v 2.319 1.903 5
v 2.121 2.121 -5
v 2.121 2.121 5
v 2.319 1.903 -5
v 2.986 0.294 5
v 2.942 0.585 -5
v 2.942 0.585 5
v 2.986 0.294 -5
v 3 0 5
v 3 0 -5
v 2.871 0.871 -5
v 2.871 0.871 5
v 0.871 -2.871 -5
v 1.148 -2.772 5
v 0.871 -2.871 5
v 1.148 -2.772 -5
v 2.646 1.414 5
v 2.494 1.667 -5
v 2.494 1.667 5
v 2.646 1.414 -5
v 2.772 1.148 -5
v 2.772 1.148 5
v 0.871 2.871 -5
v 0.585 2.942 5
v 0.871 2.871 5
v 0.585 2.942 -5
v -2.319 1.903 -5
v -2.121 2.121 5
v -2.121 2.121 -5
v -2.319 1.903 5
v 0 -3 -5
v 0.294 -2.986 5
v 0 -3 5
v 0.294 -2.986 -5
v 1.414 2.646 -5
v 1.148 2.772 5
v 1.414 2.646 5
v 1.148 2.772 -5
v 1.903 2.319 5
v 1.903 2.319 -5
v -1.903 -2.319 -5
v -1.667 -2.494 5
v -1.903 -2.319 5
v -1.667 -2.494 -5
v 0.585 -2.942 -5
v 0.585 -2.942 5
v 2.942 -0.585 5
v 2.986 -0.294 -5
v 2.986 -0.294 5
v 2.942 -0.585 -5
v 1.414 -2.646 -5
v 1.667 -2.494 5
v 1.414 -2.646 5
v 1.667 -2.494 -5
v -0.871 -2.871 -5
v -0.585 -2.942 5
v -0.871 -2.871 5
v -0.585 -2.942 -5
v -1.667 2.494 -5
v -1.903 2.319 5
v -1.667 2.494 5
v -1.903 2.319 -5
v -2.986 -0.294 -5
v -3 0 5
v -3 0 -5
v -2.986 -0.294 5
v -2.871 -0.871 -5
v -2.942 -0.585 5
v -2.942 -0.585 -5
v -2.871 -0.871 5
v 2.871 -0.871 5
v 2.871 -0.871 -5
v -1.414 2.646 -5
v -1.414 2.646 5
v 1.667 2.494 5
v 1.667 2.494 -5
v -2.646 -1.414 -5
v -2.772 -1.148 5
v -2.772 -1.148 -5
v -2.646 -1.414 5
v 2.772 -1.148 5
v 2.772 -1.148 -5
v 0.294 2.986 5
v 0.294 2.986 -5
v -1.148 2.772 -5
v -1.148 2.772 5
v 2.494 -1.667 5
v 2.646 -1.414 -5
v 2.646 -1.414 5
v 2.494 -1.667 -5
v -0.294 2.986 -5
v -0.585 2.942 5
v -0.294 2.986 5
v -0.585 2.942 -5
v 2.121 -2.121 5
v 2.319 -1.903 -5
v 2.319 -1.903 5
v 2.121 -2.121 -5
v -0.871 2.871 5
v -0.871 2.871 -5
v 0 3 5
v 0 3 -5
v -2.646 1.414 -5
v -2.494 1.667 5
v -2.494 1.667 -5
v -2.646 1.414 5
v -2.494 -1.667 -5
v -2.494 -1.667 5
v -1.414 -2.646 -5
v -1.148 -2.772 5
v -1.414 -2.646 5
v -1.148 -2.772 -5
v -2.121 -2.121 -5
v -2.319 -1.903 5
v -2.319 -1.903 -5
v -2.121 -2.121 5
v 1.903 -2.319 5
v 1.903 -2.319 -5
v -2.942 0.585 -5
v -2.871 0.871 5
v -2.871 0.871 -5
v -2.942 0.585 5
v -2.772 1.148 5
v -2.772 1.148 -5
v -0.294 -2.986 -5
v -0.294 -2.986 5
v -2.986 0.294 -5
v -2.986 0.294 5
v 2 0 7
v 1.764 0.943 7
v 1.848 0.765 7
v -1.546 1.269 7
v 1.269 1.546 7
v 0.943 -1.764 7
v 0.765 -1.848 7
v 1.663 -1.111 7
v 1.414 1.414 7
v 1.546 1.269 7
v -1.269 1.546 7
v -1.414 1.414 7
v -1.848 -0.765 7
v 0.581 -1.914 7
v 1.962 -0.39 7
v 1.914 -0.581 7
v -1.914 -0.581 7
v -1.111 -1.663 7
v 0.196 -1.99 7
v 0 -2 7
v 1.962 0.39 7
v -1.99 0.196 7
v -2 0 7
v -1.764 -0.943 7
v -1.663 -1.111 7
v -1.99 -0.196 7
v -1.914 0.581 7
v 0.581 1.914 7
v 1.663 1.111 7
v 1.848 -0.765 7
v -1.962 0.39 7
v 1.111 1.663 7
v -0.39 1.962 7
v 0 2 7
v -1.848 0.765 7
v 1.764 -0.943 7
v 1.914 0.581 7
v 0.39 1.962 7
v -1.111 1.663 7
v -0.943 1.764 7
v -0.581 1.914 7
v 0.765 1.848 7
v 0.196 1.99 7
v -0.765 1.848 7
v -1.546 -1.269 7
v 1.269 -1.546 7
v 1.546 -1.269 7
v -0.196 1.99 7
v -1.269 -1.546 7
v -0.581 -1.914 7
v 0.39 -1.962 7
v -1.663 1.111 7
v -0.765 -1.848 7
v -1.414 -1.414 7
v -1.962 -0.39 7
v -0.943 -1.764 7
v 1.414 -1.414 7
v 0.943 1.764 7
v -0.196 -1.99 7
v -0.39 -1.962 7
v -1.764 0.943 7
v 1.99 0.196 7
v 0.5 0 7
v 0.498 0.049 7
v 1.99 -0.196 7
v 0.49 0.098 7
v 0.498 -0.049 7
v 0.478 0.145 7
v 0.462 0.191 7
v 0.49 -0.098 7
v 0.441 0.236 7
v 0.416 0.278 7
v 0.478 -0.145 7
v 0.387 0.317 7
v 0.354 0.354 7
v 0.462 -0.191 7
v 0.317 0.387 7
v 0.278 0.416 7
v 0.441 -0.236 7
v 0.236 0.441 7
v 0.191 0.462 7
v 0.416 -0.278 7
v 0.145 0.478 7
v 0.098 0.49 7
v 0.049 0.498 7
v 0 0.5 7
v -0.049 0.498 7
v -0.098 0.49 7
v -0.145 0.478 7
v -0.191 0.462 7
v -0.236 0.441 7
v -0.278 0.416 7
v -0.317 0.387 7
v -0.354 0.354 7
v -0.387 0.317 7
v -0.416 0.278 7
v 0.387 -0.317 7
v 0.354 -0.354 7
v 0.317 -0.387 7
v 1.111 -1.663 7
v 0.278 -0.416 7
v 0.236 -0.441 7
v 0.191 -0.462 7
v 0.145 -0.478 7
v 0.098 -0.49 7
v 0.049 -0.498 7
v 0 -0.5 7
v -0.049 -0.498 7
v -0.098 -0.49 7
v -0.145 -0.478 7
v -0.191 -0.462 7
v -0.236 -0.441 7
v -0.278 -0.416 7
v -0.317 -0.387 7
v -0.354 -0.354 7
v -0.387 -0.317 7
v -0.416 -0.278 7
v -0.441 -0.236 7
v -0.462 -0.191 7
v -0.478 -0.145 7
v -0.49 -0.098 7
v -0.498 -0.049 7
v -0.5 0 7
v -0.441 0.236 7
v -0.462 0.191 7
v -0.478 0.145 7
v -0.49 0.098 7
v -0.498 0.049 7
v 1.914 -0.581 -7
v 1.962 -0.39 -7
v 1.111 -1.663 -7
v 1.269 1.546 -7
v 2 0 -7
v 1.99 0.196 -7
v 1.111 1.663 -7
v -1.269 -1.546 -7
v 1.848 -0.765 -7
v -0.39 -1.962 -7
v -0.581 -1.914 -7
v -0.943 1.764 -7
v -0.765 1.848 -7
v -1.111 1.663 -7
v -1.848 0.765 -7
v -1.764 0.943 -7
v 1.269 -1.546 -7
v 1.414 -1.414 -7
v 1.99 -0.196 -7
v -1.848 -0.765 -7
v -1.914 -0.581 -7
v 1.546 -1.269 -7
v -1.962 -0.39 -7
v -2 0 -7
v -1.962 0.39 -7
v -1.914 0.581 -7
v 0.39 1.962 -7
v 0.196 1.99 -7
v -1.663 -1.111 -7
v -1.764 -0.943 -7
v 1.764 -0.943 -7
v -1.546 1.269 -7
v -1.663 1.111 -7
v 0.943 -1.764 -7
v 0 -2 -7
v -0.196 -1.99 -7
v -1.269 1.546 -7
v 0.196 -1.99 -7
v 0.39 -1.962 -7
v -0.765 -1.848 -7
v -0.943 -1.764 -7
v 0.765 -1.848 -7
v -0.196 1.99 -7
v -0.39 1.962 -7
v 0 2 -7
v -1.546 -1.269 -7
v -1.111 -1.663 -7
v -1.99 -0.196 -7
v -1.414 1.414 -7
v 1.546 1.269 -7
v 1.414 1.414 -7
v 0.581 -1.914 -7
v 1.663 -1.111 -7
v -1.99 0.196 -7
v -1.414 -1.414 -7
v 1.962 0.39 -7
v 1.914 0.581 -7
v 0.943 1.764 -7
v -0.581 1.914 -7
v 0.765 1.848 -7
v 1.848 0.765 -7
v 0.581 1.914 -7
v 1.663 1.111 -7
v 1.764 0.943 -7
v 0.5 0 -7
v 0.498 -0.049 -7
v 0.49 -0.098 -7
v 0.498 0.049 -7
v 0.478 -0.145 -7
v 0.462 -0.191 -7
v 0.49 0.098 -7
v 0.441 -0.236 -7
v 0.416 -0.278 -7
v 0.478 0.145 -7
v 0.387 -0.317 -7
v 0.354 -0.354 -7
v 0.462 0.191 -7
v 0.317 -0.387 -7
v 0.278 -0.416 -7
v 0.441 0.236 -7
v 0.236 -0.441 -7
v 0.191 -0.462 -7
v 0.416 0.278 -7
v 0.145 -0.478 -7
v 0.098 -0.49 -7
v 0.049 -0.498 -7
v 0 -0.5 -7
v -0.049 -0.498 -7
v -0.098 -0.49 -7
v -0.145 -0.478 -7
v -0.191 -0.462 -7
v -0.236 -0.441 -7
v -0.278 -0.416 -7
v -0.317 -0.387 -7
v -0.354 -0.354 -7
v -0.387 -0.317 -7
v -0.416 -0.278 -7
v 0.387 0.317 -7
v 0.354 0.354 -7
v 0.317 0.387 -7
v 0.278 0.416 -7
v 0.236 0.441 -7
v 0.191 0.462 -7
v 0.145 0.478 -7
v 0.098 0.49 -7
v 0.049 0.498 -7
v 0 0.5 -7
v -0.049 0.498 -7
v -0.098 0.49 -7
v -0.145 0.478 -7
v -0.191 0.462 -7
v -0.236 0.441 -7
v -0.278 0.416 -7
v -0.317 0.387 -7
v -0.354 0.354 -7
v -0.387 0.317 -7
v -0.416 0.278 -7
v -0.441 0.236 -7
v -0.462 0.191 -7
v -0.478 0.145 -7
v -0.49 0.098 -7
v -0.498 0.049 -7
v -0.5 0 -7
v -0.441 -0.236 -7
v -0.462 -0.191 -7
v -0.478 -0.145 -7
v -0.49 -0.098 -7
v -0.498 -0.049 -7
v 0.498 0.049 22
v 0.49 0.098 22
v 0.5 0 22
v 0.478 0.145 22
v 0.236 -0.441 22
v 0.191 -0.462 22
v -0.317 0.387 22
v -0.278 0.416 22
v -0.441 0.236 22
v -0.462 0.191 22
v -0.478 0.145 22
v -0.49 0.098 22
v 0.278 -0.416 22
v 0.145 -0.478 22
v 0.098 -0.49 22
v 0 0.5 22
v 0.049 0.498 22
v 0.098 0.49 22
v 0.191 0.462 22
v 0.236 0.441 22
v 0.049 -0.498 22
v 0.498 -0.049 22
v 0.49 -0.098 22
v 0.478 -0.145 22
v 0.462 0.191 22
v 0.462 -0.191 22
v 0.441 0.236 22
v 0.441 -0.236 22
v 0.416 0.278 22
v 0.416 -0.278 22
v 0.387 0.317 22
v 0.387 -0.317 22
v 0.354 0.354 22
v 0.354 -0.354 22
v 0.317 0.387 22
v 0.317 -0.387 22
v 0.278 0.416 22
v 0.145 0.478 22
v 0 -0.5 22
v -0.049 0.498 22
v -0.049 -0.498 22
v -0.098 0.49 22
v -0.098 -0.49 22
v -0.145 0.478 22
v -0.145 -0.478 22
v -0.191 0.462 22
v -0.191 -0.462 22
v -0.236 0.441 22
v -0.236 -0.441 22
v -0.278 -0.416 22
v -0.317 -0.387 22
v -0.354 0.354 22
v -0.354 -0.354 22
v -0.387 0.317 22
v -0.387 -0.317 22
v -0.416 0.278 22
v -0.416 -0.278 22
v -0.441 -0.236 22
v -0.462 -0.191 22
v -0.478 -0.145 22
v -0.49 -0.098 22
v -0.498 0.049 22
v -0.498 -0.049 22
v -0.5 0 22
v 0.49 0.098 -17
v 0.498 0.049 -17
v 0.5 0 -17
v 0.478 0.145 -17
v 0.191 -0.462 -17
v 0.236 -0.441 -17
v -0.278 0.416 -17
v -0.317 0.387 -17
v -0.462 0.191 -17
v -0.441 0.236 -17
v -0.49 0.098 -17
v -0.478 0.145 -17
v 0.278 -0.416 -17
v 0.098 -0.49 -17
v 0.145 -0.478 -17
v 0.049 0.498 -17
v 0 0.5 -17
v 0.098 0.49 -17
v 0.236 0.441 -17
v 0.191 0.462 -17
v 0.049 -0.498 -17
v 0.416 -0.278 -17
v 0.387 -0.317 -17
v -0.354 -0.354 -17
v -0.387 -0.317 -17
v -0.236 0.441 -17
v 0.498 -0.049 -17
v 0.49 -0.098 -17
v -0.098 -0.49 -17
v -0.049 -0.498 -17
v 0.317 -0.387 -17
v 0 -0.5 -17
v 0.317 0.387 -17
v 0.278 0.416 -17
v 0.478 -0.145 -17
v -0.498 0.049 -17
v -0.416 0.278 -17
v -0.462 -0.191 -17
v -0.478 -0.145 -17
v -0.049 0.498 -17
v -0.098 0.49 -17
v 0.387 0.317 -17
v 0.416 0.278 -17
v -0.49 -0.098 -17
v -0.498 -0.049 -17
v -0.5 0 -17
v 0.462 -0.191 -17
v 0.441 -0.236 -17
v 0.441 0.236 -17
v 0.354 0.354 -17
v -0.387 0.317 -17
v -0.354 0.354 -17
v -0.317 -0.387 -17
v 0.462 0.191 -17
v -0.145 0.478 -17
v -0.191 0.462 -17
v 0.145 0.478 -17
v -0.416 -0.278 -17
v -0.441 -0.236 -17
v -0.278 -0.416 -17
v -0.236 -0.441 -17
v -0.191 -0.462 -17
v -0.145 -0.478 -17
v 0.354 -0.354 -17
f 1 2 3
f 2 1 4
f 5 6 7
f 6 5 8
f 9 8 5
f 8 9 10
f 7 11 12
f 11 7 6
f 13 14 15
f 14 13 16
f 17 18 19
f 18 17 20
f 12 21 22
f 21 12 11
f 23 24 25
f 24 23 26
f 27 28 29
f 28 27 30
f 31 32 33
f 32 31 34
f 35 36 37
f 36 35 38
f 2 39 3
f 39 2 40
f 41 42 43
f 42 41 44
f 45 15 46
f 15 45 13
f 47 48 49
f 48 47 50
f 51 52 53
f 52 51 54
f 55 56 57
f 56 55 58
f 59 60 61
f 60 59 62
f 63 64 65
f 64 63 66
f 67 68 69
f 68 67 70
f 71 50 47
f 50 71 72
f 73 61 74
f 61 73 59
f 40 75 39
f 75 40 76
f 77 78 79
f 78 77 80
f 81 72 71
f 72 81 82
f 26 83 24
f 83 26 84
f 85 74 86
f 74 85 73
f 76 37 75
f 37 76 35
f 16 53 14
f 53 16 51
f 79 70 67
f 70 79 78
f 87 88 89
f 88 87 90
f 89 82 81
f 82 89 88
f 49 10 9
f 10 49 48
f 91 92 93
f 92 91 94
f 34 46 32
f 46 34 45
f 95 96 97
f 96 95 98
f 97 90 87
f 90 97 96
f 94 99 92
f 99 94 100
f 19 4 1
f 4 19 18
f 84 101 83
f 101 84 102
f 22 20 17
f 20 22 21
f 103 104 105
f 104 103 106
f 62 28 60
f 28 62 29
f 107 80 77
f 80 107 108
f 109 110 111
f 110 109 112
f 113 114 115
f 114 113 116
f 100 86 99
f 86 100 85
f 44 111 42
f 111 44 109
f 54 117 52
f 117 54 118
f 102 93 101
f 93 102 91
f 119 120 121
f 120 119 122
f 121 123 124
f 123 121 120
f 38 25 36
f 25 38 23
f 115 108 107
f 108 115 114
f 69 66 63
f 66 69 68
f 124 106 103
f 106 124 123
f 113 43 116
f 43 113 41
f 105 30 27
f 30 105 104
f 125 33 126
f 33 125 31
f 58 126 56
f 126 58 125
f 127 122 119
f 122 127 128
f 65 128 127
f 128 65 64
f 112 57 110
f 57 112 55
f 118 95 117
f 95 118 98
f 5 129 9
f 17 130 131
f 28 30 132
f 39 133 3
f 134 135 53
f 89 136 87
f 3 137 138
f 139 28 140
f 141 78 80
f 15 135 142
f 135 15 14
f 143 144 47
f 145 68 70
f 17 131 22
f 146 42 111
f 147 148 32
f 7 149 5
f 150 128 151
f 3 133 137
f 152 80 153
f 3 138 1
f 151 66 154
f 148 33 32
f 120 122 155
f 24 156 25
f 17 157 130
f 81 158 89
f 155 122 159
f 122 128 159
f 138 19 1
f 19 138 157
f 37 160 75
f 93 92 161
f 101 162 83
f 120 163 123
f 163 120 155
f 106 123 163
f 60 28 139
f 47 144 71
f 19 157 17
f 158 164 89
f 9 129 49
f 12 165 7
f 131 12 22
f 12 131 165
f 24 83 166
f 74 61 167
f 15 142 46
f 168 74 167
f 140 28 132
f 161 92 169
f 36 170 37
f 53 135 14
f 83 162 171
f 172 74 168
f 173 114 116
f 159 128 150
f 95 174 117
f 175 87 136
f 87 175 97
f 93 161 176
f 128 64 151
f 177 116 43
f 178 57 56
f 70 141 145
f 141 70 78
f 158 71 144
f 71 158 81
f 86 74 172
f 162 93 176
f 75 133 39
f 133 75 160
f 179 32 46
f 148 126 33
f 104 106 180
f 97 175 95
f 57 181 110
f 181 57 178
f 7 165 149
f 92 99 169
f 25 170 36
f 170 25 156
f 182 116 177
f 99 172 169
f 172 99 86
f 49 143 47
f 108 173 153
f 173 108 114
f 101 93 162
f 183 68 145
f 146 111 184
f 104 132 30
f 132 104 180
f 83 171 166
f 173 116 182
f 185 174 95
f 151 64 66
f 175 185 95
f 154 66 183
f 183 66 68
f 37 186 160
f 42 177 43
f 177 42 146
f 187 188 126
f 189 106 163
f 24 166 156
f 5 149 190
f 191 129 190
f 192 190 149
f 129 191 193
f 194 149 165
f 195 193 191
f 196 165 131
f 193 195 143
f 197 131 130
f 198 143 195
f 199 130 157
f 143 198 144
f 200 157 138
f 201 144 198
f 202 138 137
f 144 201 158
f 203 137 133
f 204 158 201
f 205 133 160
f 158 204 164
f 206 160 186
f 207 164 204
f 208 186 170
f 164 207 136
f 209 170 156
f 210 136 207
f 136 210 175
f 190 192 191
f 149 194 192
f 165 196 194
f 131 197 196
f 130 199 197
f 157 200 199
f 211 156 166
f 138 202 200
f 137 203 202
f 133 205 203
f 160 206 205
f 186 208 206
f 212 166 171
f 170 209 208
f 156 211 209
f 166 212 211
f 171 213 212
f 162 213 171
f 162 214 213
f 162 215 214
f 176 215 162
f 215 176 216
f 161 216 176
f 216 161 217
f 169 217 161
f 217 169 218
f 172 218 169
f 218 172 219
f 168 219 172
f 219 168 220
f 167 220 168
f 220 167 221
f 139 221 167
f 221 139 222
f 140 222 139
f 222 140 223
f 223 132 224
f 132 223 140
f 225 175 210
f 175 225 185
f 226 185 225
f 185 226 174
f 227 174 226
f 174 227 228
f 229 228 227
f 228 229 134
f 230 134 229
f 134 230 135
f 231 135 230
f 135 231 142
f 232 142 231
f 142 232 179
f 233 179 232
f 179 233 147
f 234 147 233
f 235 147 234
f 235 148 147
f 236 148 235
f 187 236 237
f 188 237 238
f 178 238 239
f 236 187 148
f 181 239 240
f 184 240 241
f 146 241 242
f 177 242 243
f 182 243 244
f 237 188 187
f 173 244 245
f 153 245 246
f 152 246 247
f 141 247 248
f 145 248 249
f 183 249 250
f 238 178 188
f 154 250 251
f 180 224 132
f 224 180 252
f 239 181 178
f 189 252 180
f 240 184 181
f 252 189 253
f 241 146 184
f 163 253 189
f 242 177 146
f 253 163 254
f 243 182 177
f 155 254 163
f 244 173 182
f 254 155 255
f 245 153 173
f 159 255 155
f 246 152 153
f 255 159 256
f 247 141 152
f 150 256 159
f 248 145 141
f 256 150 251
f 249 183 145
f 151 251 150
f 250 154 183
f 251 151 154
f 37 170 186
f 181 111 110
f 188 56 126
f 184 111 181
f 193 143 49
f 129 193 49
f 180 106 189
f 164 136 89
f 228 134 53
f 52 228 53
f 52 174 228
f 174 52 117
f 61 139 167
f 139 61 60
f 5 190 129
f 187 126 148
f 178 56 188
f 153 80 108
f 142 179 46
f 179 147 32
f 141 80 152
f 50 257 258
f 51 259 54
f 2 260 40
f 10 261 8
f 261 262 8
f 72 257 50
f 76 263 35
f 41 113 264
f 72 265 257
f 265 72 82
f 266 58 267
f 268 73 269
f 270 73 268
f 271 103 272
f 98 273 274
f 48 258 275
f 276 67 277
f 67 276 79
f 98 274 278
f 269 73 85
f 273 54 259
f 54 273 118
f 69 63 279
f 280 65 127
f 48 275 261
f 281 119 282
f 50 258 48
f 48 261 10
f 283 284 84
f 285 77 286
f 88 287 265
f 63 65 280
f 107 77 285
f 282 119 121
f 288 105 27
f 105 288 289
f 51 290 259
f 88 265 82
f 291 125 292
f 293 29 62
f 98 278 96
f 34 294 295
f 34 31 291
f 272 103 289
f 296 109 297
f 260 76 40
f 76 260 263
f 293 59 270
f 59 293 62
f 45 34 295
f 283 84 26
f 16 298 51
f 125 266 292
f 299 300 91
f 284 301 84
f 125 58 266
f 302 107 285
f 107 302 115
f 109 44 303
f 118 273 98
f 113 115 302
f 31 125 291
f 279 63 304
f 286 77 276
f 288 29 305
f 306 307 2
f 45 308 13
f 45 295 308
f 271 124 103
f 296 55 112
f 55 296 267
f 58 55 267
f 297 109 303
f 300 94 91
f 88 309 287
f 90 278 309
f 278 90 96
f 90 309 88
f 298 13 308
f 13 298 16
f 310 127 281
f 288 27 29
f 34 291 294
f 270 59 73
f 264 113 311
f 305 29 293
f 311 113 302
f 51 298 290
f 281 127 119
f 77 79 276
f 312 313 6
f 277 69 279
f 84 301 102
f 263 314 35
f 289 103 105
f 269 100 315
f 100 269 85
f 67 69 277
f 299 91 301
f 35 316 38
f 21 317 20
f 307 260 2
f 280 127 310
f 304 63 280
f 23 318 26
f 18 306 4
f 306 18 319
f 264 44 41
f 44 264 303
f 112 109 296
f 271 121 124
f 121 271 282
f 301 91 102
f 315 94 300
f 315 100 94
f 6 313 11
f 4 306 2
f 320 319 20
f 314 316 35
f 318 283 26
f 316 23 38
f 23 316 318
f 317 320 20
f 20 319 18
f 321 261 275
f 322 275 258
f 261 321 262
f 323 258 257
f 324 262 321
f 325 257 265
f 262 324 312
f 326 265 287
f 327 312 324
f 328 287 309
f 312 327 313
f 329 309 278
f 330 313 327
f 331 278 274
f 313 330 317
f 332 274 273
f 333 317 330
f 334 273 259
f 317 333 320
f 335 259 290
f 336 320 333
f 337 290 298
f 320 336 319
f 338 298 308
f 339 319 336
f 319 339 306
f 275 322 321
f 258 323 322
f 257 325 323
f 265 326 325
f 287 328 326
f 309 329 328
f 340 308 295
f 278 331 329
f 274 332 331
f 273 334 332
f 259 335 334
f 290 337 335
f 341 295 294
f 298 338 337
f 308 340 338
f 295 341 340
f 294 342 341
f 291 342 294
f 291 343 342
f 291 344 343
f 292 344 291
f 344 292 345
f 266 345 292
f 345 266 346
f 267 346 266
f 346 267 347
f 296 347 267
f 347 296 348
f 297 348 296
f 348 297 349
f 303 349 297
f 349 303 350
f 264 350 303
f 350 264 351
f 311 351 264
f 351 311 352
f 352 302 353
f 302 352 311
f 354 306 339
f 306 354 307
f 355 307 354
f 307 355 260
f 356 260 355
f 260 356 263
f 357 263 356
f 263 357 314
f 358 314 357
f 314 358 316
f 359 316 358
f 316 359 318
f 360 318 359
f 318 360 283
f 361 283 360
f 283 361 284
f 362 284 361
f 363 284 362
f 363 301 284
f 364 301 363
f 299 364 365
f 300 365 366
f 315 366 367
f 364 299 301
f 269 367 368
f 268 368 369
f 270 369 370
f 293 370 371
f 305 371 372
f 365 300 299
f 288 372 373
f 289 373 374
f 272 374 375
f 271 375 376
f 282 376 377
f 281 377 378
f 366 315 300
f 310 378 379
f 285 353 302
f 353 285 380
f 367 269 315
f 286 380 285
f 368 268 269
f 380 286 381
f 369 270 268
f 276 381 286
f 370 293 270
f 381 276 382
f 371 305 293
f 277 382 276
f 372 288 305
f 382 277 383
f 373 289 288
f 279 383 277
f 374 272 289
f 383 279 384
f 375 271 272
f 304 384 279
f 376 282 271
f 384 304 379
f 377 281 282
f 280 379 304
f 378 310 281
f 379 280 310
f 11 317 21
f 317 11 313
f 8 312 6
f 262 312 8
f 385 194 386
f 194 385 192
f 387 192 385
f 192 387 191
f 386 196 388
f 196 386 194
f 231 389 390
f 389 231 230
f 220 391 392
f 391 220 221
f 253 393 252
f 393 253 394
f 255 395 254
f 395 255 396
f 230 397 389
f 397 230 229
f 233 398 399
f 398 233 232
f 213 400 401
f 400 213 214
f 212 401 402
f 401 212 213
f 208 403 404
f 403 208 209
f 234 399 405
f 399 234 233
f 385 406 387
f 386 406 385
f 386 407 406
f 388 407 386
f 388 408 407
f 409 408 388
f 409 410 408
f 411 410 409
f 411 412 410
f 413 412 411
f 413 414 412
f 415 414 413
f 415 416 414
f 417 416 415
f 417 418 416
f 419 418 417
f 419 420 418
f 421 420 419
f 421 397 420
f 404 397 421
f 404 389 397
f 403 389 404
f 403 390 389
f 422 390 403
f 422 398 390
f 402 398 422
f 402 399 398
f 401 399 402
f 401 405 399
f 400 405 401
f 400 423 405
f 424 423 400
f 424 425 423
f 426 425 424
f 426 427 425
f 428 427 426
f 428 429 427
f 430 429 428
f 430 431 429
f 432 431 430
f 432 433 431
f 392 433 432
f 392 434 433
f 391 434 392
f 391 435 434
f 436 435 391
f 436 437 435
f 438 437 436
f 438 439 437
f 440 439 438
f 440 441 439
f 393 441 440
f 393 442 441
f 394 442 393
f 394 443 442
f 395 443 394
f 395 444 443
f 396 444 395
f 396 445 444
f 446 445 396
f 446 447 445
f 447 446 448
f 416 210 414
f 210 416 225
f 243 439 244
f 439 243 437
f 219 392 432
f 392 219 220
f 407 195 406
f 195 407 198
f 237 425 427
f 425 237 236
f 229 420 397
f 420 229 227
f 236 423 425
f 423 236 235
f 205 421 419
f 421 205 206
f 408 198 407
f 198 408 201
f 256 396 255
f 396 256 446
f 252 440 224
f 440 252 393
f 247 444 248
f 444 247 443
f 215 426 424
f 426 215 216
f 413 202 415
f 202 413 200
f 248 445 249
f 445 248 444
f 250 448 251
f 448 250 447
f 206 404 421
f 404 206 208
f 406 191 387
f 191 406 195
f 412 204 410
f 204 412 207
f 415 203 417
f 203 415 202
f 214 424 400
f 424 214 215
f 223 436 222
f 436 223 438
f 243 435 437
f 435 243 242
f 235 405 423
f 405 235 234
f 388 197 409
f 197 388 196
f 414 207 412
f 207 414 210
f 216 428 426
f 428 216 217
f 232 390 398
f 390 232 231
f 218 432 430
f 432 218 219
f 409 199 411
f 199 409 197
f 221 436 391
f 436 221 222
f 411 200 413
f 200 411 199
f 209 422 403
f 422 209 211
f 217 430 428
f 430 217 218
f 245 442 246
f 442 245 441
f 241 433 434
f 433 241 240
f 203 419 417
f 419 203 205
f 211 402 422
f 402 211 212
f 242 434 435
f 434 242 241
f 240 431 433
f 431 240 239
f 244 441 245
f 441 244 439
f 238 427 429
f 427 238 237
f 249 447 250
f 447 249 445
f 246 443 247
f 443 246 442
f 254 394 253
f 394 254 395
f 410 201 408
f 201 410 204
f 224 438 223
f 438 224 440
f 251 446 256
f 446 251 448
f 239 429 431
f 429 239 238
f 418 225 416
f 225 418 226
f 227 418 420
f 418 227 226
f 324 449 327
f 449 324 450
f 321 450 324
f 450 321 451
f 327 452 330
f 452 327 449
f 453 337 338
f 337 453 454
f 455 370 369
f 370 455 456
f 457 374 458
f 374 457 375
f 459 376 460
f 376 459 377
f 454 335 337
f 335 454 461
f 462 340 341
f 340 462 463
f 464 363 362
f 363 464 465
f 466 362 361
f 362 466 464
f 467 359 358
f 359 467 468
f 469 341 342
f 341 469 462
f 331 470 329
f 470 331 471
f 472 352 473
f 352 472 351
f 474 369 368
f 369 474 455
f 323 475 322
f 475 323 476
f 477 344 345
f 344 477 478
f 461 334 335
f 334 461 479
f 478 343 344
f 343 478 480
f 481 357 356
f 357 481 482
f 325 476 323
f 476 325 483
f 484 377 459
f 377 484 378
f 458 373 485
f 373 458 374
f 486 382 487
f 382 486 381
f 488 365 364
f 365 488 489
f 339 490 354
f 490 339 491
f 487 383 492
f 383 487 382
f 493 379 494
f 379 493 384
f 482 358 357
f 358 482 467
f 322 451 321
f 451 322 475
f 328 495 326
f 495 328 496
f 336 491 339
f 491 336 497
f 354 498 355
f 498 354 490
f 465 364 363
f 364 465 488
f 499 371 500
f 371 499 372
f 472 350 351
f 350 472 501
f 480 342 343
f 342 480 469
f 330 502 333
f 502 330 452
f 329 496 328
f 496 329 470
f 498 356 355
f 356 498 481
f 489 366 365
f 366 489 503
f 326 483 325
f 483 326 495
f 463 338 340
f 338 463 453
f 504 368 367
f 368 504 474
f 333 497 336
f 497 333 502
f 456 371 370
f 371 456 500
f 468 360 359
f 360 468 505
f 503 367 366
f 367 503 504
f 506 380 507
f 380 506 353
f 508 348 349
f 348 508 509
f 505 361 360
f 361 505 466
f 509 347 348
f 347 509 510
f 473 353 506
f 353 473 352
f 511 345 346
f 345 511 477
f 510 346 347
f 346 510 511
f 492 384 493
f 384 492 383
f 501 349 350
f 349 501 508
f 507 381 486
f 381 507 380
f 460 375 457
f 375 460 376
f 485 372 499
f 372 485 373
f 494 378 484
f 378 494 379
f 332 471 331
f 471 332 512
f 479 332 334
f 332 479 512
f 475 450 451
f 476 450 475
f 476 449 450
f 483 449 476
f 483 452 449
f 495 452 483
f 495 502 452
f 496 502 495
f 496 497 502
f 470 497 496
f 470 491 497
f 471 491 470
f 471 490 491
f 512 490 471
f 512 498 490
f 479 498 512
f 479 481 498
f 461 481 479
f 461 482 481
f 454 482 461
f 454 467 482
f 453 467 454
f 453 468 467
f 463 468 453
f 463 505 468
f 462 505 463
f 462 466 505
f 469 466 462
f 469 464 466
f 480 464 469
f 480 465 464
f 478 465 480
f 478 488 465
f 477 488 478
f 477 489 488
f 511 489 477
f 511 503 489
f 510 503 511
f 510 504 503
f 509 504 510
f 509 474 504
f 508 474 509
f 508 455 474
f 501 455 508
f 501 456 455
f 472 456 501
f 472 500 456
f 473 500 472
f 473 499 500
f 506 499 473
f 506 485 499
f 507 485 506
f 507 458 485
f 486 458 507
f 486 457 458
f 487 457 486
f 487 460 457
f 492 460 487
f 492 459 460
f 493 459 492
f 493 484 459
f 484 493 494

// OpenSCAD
module resistor() {
    $fn = 64;
    // Main body of the resistor
    cylinder(h = 10, r = 3, center = true);
    
    // End caps
    translate([0, 0, 5])
        cylinder(h = 2, r1 = 3, r2 = 2, center = false);
    translate([0, 0, -7])
        cylinder(h = 2, r1 = 2, r2 = 3, center = false);
    
    // Wires
    translate([0, 0, 7])
        cylinder(h = 15, r = 0.5, center = false);
    translate([0, 0, -17])
        cylinder(h = 15, r = 0.5, center = false);
}

resistor();
